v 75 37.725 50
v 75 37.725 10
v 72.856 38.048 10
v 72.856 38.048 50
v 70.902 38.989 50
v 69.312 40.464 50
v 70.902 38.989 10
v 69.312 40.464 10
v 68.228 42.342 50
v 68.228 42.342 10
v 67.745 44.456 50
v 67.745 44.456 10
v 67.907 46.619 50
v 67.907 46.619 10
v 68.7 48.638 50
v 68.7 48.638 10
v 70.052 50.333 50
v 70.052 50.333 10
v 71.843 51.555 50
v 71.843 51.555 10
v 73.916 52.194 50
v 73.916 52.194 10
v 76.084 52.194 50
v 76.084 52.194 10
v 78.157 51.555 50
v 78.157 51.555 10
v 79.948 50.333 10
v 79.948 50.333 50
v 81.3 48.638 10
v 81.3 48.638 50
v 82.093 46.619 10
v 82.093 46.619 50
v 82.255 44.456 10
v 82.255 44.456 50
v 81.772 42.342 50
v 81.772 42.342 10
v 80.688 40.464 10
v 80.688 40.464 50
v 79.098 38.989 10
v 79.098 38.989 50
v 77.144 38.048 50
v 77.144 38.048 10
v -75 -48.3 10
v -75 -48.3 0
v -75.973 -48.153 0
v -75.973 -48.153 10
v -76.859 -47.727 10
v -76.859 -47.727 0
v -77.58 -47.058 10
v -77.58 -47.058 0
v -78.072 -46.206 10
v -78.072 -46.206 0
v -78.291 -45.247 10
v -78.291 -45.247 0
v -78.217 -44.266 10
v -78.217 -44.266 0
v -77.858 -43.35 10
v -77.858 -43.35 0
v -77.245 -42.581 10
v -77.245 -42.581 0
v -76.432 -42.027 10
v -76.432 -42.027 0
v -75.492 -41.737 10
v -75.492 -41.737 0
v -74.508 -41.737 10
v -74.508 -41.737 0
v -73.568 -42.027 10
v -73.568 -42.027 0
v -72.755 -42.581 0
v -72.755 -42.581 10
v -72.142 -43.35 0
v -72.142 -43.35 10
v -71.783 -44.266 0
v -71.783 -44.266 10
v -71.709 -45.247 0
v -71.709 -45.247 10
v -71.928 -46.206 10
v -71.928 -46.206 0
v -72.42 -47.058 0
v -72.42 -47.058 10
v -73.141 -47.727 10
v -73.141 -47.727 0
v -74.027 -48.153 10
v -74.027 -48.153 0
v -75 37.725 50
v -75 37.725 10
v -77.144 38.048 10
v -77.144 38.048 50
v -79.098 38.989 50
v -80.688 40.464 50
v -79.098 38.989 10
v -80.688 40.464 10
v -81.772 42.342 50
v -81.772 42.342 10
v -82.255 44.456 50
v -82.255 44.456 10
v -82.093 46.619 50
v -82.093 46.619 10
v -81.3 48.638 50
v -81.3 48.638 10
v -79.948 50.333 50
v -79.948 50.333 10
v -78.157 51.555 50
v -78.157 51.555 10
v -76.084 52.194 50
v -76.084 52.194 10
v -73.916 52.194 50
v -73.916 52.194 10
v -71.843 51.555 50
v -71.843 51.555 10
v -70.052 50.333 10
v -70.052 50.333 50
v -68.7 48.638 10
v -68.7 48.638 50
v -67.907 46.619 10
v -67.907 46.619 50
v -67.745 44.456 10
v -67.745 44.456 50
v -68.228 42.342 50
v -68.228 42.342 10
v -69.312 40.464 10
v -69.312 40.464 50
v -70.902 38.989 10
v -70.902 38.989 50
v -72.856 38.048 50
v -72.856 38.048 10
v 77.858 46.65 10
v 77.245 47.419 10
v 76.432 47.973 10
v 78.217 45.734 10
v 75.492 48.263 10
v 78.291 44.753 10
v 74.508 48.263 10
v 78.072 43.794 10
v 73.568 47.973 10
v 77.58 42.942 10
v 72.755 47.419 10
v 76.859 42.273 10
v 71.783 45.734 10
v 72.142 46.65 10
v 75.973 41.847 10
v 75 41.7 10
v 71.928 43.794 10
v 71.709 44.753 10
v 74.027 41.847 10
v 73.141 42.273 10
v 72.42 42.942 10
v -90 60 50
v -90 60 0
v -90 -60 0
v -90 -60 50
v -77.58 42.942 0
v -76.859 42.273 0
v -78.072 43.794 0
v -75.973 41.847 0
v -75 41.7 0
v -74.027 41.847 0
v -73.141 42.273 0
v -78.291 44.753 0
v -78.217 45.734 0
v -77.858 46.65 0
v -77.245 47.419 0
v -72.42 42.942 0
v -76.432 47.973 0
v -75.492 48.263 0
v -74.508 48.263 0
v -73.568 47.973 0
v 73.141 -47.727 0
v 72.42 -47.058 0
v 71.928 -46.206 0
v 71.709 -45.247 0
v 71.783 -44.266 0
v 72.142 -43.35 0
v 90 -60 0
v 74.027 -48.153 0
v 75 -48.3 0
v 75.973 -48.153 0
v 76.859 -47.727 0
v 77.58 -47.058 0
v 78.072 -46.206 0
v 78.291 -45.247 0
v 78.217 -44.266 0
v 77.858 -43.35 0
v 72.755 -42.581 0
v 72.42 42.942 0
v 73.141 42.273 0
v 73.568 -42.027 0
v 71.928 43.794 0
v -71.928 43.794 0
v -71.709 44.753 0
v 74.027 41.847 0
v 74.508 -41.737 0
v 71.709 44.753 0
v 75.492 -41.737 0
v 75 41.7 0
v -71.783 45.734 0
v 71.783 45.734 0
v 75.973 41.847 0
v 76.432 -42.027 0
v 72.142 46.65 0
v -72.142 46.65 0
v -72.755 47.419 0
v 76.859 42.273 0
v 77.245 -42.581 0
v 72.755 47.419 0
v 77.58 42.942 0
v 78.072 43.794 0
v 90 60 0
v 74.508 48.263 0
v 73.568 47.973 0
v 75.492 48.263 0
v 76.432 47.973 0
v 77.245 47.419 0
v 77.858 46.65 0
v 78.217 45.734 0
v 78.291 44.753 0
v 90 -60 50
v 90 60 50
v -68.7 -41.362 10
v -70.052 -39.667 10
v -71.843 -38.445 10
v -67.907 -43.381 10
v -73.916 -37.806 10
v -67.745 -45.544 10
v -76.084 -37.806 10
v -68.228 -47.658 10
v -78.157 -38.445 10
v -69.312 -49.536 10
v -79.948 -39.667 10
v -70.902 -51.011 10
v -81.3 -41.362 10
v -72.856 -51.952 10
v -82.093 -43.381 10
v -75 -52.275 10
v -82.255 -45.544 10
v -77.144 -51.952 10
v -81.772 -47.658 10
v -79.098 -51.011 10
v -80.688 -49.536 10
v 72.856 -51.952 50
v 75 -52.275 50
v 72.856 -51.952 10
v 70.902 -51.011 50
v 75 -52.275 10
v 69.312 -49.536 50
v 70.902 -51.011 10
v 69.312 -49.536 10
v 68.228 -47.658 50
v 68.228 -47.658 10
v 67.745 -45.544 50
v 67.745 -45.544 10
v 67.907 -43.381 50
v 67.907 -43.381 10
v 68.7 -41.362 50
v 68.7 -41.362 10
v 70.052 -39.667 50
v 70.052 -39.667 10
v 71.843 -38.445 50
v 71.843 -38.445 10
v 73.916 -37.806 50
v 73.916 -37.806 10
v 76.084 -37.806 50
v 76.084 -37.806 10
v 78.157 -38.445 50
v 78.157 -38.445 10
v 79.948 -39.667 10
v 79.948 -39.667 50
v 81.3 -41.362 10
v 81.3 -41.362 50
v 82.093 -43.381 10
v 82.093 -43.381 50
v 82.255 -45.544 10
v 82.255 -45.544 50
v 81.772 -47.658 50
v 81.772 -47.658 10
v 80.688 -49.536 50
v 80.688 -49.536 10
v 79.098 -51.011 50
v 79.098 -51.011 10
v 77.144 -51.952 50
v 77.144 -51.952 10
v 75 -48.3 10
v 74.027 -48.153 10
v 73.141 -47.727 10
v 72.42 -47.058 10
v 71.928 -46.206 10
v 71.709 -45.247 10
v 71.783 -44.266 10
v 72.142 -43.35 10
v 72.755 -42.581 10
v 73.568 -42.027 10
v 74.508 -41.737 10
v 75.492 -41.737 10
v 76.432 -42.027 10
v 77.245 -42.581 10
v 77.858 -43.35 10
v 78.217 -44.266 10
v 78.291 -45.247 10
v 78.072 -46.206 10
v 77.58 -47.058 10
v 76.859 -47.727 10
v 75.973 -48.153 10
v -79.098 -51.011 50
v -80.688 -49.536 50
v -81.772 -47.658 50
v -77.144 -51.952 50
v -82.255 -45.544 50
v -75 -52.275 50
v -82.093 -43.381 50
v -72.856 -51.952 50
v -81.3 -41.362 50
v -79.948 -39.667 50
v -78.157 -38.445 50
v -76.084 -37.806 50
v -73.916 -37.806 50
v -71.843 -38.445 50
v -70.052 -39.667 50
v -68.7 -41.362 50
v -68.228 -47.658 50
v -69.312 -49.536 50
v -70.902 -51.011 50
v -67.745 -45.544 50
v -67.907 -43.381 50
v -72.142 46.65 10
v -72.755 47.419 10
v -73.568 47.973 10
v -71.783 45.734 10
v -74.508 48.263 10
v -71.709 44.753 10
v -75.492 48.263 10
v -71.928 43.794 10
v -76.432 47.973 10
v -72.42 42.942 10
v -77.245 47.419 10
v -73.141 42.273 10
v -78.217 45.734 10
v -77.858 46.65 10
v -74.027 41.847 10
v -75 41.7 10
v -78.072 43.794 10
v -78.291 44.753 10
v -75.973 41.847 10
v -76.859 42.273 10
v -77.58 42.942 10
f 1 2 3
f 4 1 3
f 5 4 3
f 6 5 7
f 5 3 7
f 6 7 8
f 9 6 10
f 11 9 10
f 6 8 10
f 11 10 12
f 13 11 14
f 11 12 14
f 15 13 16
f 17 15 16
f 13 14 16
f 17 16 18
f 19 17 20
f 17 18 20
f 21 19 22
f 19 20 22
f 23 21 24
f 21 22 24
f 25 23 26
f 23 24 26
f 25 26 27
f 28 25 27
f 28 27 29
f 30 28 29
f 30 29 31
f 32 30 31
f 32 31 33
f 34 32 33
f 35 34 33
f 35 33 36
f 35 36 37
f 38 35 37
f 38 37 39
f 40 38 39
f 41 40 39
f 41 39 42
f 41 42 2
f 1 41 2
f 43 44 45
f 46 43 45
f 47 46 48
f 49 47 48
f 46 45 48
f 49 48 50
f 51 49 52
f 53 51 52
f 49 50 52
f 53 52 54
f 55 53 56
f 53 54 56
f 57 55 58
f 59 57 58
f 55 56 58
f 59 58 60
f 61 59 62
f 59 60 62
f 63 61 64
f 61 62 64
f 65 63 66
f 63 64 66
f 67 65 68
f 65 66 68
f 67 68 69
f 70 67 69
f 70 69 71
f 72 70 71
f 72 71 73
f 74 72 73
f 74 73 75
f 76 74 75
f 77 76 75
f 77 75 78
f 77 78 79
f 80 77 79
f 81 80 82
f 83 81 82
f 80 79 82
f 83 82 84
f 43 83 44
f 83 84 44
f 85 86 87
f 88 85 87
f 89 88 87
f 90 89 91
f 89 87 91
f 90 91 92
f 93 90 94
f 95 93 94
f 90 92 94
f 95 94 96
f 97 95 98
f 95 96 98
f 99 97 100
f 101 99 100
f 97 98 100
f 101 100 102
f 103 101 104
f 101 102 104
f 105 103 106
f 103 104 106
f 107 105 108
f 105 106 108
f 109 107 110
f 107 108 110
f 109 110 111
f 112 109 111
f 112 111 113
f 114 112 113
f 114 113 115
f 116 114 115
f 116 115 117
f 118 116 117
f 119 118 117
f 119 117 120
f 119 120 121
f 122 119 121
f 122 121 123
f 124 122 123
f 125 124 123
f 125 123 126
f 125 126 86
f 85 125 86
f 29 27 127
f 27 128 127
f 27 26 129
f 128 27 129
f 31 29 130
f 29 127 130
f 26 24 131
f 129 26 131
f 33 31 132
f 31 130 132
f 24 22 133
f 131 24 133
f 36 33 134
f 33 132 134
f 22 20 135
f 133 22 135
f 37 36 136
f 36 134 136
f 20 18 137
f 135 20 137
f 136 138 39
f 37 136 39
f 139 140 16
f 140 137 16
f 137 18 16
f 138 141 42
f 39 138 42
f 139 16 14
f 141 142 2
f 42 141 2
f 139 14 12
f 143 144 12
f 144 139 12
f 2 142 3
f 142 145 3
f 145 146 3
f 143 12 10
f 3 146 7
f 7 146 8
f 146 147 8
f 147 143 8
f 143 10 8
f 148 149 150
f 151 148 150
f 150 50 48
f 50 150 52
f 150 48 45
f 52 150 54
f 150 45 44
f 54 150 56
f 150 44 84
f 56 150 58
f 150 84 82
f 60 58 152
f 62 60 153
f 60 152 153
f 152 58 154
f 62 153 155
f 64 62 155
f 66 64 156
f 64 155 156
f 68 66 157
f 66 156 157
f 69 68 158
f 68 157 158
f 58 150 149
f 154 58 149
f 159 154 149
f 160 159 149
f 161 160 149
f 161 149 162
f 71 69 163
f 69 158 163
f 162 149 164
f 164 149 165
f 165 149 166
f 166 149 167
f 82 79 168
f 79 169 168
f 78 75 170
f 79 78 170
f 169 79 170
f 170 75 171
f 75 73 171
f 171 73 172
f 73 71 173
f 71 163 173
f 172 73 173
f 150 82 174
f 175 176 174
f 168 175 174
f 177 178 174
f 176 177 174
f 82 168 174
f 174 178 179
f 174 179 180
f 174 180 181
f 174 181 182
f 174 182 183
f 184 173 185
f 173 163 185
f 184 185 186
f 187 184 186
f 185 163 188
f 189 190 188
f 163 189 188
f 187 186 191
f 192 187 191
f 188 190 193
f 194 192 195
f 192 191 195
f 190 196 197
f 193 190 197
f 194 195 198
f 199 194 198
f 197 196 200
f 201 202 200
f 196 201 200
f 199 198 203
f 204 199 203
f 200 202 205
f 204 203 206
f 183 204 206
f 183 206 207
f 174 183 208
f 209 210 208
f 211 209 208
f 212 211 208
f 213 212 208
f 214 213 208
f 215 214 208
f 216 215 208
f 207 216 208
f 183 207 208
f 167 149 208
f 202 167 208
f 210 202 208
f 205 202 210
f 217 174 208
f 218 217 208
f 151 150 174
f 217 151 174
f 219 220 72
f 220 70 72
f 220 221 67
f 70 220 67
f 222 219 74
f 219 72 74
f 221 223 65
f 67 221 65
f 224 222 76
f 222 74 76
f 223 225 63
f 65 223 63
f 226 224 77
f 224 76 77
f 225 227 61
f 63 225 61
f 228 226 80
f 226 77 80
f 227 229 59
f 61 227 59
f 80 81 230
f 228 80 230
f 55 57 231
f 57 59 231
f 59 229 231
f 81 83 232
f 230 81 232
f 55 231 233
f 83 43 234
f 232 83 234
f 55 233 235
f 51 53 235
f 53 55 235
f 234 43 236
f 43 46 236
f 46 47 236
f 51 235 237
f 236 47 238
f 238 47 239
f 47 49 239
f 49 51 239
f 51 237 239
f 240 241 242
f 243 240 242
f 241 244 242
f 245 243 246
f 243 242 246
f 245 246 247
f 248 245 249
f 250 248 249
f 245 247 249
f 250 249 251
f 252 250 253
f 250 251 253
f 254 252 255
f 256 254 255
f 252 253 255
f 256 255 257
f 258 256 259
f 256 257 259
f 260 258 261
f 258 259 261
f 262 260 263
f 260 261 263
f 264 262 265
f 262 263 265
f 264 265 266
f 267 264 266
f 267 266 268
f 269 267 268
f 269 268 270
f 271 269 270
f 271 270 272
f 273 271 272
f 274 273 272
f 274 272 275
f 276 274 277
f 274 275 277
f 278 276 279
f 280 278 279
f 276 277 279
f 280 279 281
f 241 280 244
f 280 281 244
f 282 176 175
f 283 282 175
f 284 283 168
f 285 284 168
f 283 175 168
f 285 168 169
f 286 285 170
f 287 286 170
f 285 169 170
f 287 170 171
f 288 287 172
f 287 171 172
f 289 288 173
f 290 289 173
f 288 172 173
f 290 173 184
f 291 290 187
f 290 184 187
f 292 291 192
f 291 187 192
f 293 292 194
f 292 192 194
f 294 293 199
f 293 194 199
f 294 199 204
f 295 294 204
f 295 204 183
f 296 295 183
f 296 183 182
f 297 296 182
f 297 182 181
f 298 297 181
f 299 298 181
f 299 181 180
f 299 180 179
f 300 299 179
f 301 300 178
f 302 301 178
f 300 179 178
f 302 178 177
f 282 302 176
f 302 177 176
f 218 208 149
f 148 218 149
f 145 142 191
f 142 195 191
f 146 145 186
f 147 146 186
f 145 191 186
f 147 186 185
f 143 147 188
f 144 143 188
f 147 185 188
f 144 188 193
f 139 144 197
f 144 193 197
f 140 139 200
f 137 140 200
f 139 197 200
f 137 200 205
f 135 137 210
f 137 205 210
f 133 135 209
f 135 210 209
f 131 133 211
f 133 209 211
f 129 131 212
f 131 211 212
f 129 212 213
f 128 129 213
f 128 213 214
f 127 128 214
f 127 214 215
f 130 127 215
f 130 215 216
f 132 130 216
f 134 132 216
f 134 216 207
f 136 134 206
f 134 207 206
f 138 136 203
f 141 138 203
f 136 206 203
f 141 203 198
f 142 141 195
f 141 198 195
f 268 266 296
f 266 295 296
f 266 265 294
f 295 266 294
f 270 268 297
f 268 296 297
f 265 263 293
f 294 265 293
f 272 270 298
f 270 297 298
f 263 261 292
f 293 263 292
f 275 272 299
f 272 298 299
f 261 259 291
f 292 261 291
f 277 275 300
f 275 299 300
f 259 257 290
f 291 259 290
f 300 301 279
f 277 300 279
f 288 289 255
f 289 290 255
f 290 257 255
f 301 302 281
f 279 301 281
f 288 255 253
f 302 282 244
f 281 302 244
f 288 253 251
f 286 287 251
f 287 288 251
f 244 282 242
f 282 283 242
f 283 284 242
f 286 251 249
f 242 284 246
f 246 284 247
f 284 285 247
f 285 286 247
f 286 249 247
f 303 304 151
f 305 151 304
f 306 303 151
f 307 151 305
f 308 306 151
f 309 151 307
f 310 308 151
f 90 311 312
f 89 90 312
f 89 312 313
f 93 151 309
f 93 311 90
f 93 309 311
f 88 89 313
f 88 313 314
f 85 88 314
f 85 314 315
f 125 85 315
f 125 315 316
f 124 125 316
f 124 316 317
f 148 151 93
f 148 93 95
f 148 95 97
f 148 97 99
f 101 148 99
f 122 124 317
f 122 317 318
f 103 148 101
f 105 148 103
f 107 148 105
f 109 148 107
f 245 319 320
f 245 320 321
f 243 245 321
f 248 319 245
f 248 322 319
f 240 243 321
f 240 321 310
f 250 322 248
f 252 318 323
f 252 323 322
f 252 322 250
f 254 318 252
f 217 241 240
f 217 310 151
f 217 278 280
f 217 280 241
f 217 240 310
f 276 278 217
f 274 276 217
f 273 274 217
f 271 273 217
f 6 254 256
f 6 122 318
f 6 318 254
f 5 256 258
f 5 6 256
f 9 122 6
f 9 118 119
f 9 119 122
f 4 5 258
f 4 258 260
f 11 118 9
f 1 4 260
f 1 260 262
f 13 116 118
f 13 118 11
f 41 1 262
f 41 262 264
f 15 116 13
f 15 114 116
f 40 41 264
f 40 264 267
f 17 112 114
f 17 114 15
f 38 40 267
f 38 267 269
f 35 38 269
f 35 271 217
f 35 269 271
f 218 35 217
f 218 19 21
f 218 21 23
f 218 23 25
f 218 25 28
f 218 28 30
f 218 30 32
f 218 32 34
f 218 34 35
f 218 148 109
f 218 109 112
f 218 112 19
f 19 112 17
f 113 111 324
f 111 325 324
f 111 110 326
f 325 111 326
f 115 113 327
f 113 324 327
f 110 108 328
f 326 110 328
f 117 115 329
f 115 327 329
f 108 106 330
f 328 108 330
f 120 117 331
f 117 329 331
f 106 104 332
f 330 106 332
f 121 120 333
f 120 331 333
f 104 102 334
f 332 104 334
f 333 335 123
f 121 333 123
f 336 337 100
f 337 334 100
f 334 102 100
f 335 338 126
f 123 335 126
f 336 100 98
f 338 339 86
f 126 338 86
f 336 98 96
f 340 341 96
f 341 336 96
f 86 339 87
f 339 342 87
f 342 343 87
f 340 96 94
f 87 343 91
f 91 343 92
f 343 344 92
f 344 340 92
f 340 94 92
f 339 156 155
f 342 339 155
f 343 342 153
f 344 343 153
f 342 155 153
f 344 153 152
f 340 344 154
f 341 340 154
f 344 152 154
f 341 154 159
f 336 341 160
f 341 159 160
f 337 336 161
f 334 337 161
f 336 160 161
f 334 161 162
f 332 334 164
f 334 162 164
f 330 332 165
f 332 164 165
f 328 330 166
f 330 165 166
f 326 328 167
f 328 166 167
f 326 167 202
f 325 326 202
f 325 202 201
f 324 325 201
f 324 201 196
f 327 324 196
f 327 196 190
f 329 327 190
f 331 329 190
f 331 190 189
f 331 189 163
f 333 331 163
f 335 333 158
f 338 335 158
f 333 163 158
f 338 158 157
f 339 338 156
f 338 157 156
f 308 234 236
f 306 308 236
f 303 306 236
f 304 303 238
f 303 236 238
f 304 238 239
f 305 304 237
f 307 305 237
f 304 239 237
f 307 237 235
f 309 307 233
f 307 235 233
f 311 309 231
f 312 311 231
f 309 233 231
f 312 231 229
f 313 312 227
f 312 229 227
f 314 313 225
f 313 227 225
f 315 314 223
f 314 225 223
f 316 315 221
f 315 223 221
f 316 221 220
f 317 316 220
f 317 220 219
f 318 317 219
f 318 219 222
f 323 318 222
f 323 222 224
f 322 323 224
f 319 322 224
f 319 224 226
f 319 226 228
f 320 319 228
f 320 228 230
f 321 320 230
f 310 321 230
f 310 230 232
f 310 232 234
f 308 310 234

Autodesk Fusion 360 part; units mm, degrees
sketch "Skizze1" plane through (0, 0, 0) normal (0, 0, 1) x (1, 0, 0)
  line L0 (-90, -60) -> (90, -60)
  line L1 (90, -60) -> (90, 60)
  line L2 (90, 60) -> (-90, 60)
  line L3 (-90, 60) -> (-90, -60)
  line L4 (0, -120.4862) -> (0, 94.8054) construction
  line L5 (-128.125, 0) -> (128.8109, 0) construction
  line L6 (-75, 45) -> (75, 45)
  line L7 (75, 45) -> (75, -45)
  line L8 (75, -45) -> (-75, -45)
  line L9 (-75, -45) -> (-75, 45)
  point P0 (0, 60)
  point P1 (-90, 0)
  point P2 (-75, 45)
  point P3 (75, 45)
  point P4 (75, -45)
  point P5 (-75, -45)
  dimension "d1" = 120
  dimension "d2" = 180
  dimension "d3" = 15
  dimension "d4" = 15
  dimension "d5" = 15
  dimension "d6" = 15
extrude "Extrusion1" add sketch "Skizze1" along normal blind 50 contours L0 L1 L2 L3 | L6 L7 L8 L9
sketch "Skizze2" plane through (0, 0, 50) normal (0, 0, 1) x (-1, 0, 0)
  line L0 (90, -60) -> (90, 60)
  line L1 (90, 60) -> (-90, 60)
  line L2 (-90, 60) -> (-90, -60)
  line L3 (-90, -60) -> (90, -60)
  point P0 (-75, 45)
  point P1 (-75, -45)
  point P2 (75, -45)
  point P3 (75, 45)
hole "Bohrung1" at (-75, 45, 50) at (-75, -45, 50) at (75, -45, 50) at (75, 45, 50) direction (0, 0, -1) diameter 6.6 depth 50 tip angle 180 counterbore diameter 14.55 counterbore depth 40
